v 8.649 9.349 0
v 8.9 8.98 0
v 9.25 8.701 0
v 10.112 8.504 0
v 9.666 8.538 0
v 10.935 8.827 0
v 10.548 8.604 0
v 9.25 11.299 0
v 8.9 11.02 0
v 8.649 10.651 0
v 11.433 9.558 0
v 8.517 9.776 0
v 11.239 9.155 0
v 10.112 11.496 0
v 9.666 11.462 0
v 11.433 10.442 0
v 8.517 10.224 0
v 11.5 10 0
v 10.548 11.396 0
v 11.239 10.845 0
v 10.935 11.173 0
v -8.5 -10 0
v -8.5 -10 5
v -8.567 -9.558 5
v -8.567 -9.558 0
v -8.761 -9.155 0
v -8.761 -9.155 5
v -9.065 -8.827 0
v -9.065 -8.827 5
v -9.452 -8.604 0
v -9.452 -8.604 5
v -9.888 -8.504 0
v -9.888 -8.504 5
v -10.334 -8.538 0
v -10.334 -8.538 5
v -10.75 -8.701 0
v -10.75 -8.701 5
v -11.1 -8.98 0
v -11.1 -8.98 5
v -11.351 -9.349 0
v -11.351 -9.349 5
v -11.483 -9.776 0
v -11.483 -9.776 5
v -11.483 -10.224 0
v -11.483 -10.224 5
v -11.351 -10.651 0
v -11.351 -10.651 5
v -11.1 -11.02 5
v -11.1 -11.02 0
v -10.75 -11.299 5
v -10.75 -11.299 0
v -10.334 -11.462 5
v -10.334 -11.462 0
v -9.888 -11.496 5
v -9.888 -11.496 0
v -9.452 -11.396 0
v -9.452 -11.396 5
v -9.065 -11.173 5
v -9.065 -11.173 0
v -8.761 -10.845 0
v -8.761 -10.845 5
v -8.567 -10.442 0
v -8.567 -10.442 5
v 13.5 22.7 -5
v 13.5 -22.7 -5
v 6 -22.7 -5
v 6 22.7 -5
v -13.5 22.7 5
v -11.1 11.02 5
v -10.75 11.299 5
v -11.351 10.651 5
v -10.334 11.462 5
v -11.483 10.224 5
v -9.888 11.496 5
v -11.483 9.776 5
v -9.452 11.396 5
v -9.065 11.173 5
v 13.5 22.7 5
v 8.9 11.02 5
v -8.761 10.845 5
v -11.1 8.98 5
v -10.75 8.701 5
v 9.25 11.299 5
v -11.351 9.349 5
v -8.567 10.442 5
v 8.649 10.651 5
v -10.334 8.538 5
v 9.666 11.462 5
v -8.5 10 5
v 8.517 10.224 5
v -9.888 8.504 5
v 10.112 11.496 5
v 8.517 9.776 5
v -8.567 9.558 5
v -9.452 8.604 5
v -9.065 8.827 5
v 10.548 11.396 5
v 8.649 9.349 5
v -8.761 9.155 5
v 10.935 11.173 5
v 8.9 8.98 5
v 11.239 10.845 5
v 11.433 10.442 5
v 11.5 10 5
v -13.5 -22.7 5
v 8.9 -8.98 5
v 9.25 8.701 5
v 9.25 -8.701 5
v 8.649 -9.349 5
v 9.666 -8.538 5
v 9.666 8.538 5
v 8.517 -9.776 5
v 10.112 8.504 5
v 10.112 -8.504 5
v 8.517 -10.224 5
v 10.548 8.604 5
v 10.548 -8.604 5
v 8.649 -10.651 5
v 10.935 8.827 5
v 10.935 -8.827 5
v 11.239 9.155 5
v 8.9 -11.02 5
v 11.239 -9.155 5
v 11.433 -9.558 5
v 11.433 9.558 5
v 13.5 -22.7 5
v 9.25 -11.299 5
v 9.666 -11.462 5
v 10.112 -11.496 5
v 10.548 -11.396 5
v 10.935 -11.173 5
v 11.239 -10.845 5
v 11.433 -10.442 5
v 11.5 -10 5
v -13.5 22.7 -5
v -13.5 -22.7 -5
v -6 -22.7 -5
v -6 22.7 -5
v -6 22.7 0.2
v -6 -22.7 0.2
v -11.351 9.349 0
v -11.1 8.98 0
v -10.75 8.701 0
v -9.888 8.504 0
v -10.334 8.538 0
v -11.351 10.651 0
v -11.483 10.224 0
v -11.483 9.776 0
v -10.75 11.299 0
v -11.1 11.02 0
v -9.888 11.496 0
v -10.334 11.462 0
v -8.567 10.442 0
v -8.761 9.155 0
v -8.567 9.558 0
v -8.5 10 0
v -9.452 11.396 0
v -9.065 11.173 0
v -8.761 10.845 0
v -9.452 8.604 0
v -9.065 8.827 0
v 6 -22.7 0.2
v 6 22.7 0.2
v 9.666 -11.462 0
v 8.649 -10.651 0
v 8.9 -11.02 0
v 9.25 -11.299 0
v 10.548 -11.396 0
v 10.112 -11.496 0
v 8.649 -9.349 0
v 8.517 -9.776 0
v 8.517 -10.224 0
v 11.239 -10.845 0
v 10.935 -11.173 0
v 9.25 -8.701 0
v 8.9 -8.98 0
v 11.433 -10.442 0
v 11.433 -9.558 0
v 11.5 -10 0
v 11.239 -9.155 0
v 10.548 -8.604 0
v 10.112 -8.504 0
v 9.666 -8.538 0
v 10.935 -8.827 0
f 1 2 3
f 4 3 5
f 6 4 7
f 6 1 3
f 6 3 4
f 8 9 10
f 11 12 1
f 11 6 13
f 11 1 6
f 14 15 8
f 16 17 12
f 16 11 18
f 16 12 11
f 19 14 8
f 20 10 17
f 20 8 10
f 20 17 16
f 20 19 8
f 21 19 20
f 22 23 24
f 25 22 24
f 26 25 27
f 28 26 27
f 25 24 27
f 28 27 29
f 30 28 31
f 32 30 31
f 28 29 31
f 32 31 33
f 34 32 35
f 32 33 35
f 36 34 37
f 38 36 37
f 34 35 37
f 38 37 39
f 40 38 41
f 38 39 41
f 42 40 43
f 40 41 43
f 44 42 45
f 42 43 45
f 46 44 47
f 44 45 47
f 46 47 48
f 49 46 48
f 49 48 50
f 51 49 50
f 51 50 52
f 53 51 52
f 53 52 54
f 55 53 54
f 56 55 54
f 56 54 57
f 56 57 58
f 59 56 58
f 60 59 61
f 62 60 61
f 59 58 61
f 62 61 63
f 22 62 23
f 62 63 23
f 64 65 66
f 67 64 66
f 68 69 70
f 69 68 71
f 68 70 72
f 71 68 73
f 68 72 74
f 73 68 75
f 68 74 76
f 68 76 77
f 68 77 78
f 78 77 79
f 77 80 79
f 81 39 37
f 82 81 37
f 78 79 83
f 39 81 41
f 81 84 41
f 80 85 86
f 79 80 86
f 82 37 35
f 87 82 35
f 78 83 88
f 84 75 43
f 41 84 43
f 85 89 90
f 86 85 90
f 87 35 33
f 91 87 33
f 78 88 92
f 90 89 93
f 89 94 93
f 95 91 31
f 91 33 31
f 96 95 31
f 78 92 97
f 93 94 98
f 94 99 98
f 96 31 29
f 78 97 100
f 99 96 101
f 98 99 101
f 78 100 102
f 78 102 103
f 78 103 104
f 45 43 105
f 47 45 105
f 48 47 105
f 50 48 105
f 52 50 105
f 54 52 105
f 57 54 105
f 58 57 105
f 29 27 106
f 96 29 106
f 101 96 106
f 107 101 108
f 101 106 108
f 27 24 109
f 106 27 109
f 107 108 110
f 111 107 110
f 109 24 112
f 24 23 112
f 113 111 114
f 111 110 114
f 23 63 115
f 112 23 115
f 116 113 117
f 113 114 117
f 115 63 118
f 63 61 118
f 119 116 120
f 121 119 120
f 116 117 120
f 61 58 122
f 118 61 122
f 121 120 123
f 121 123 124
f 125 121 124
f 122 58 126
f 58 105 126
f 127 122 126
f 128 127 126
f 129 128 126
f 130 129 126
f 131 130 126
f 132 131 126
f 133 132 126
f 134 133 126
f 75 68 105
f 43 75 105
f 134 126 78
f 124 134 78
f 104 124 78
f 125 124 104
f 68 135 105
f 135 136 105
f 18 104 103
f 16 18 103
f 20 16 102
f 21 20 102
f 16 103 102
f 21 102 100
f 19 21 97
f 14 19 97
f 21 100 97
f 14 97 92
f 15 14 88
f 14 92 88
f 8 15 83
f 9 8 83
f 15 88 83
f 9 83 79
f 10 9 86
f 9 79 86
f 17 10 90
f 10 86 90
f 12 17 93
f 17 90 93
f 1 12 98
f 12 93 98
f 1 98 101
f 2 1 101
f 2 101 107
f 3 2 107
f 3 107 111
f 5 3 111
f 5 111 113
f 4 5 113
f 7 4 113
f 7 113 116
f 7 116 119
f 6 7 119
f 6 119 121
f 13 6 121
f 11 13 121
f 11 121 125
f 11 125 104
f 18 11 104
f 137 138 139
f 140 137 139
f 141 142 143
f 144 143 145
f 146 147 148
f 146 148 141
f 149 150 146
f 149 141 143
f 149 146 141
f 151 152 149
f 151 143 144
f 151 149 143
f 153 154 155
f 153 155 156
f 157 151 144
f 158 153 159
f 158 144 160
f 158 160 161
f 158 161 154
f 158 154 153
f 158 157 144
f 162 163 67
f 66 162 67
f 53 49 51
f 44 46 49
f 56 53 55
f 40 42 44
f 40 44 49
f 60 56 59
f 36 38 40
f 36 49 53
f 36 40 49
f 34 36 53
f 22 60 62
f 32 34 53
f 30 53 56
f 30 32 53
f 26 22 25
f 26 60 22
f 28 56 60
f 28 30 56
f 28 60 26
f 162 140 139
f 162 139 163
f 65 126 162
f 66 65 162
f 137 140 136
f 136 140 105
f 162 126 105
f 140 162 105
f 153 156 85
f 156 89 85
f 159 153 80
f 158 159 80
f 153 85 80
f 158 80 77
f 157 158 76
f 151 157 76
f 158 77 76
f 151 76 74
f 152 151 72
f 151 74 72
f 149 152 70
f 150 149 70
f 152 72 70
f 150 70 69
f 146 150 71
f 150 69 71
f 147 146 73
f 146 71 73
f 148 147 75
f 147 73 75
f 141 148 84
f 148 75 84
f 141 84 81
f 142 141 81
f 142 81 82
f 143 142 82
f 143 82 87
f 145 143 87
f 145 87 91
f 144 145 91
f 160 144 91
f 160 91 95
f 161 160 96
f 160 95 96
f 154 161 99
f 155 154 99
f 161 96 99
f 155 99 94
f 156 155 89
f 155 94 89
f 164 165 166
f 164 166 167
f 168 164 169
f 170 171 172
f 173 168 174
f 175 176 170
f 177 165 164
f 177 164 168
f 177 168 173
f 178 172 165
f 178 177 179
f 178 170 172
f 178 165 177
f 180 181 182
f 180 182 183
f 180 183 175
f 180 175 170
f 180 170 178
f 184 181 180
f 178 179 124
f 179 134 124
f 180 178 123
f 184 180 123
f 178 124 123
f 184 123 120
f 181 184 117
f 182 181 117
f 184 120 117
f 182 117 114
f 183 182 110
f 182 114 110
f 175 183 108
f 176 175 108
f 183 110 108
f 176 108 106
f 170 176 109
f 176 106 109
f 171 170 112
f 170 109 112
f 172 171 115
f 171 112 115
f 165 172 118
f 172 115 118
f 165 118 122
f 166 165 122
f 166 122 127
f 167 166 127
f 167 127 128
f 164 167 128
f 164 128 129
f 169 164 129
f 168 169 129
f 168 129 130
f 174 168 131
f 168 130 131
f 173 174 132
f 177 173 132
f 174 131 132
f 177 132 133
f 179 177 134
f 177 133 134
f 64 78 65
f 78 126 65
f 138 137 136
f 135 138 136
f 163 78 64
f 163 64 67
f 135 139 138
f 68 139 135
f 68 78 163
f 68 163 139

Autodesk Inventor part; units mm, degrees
sketch "Эскиз1" plane through (0, 0, 0) normal (0, 1, 0) x (-1, 0, 0)
  line L0 (-13.5, -5) -> (13.5, -5)
  line L1 (13.5, -5) -> (13.5, 5)
  line L2 (13.5, 5) -> (-13.5, 5)
  line L3 (-13.5, 5) -> (-13.5, -5)
  line L4 (-13.5, -5) -> (13.5, 5) construction
  line L5 (13.5, -5) -> (-13.5, 5) construction
  line L6 (-6, -5) -> (6, -5)
  line L7 (6, -5) -> (6, 0.2)
  line L8 (6, 0.2) -> (-6, 0.2)
  line L9 (-6, 0.2) -> (-6, -5)
  line L10 (0, -7) -> (0, 7) construction
  point P0 (0, 0)
  point P1 (0, 0.2)
  dimension "d0" = 27
  dimension "d1" = 10
  dimension "d2" = 12
  dimension "d3" = 5.2
extrude "Выдавливание1" add sketch "Эскиз1" along normal mid plane 45.4 contours L3 L2 L1 L0 L7 L8 L9
sketch "Эскиз2" plane through (-13.5, 22.7, 5) normal (0, 0, 1) x (1, 0, 0)
  circle A0 centre (3.5, -12.7) radius 1.5
  circle A1 centre (3.5, -32.7) radius 1.5
  circle A2 centre (23.5, -12.7) radius 1.5
  circle A3 centre (23.5, -32.7) radius 1.5
  line L0 (3.5, -12.7) -> (3.5, -32.7) construction
  line L1 (3.5, -32.7) -> (23.5, -12.7) construction
  line L2 (23.5, -12.7) -> (3.5, -12.7) construction
  line L3 (23.5, -32.7) -> (23.5, -12.7) construction
  line L4 (3.5, -32.7) -> (23.5, -32.7) construction
  line L5 (23.5, -32.7) -> (3.5, -12.7) construction
  point P0 (13.5, -22.7)
  point P1 (13.5, -22.7)
  dimension "d6" = 3
  dimension "d7" = 20
  dimension "d8" = 20
extrude "Выдавливание2" cut sketch "Эскиз2" against normal blind 5
properties part number "Каретка"
